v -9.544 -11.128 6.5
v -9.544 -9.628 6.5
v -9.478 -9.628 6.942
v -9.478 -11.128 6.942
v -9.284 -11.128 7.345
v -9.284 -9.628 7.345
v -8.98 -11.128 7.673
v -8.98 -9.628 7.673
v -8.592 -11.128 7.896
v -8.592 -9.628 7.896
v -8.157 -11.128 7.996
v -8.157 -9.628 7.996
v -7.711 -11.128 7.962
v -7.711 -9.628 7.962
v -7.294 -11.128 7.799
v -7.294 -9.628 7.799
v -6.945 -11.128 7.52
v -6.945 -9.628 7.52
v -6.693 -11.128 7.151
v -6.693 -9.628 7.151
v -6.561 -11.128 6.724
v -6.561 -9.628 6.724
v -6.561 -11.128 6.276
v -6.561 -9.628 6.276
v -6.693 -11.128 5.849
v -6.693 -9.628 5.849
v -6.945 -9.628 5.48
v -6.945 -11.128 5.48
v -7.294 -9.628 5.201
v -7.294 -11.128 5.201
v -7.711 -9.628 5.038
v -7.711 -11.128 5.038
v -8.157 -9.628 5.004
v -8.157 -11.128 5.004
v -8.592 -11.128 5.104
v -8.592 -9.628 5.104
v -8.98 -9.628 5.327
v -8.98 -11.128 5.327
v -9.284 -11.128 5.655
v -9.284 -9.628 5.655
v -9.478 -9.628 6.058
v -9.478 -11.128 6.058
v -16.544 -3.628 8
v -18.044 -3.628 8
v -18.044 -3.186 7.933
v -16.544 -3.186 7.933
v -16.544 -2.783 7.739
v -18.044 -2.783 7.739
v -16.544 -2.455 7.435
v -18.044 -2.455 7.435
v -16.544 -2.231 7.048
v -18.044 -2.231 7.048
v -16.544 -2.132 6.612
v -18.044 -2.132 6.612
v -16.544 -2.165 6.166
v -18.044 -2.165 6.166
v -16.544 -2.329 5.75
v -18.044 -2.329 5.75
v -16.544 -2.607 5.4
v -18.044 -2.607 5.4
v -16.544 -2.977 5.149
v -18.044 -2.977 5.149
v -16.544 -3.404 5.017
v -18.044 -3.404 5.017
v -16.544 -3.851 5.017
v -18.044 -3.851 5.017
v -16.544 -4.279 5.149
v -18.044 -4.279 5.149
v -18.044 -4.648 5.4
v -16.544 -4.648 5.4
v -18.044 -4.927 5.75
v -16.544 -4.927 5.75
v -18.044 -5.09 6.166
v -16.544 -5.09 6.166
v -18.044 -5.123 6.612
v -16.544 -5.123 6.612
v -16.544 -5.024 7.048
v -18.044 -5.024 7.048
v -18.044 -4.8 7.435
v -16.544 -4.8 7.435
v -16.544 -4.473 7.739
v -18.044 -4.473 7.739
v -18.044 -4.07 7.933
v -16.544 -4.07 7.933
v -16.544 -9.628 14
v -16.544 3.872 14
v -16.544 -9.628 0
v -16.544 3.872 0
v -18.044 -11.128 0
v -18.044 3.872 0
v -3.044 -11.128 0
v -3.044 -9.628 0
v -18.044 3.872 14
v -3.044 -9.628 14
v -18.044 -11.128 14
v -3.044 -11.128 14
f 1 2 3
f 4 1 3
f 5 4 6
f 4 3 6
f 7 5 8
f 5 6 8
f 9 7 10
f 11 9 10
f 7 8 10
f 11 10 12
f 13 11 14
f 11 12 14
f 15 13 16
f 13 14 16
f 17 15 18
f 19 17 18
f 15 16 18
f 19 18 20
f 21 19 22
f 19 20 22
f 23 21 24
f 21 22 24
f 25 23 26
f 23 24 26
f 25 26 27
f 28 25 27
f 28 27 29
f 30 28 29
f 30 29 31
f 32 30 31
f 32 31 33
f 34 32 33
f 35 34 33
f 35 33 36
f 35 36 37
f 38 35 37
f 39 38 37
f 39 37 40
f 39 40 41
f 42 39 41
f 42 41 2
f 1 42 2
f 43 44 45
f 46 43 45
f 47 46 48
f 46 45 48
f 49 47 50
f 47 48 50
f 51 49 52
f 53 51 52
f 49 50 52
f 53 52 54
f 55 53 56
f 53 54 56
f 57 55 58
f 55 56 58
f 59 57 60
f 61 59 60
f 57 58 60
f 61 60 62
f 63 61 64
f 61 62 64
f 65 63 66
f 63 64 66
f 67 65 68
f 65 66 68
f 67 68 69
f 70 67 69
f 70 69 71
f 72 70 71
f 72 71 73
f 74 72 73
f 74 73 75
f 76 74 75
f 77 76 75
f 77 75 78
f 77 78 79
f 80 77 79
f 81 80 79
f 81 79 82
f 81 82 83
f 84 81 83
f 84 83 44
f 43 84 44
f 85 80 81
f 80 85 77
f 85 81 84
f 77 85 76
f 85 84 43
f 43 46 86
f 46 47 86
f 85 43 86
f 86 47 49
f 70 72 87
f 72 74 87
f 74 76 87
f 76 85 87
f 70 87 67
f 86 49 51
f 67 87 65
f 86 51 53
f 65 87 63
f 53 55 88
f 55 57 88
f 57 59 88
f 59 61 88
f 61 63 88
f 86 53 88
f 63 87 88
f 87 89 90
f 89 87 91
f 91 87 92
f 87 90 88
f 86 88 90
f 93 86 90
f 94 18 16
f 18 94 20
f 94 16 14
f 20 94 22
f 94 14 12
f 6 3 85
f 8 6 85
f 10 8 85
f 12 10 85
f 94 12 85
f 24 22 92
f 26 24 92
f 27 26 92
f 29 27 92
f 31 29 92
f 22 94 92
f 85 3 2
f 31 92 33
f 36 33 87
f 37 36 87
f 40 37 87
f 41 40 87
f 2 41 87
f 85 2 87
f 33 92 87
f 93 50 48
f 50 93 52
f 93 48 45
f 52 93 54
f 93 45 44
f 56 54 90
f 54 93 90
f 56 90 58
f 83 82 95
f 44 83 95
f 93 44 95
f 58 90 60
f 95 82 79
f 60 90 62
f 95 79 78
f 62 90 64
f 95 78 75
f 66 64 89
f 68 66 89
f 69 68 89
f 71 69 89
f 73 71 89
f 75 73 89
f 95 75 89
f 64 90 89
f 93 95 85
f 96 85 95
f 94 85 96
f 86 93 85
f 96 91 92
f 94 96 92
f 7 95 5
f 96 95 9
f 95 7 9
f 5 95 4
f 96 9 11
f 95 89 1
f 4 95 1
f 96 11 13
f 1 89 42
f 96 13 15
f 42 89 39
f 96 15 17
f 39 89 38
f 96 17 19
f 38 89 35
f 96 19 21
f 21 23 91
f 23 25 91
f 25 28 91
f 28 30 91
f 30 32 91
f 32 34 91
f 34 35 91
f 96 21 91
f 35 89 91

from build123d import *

# Parameters (mm, degrees)
EXTRUSION1_DEPTH = 14
ESQUISSE2_R      = 1.5
EXTRUSION2_DEPTH = 14
ESQUISSE3_R      = 1.5
EXTRUSION3_DEPTH = 14


with BuildPart() as part:
    # Esquisse1 → Extrusion1 (new body)
    with BuildSketch(Plane.XY):
        Polygon((-18.044406835, 3.872316684), (-18.044406835, -11.127683316), (-3.044406835, -11.127683316), (-3.044406835, -9.627683316), (-16.544406835, -9.627683316), (-16.544406835, 3.872316684), align=None)
    extrude(amount=EXTRUSION1_DEPTH)

    # Esquisse2 → Extrusion2 (cut)
    with BuildSketch(Plane(origin=(0, -9.627683316, 0), x_dir=(-1, 0, 0), z_dir=(0, 1, 0))):
        with Locations((8.044406835, 6.5)):
            Circle(ESQUISSE2_R)
    extrude(amount=-EXTRUSION2_DEPTH, mode=Mode.SUBTRACT)

    # Esquisse3 → Extrusion3 (cut)
    with BuildSketch(Plane.ZY.offset(18.044406835)):
        with Locations((6.5, -3.627683316)):
            Circle(ESQUISSE3_R)
    extrude(amount=-EXTRUSION3_DEPTH, mode=Mode.SUBTRACT)


solid = part.part
